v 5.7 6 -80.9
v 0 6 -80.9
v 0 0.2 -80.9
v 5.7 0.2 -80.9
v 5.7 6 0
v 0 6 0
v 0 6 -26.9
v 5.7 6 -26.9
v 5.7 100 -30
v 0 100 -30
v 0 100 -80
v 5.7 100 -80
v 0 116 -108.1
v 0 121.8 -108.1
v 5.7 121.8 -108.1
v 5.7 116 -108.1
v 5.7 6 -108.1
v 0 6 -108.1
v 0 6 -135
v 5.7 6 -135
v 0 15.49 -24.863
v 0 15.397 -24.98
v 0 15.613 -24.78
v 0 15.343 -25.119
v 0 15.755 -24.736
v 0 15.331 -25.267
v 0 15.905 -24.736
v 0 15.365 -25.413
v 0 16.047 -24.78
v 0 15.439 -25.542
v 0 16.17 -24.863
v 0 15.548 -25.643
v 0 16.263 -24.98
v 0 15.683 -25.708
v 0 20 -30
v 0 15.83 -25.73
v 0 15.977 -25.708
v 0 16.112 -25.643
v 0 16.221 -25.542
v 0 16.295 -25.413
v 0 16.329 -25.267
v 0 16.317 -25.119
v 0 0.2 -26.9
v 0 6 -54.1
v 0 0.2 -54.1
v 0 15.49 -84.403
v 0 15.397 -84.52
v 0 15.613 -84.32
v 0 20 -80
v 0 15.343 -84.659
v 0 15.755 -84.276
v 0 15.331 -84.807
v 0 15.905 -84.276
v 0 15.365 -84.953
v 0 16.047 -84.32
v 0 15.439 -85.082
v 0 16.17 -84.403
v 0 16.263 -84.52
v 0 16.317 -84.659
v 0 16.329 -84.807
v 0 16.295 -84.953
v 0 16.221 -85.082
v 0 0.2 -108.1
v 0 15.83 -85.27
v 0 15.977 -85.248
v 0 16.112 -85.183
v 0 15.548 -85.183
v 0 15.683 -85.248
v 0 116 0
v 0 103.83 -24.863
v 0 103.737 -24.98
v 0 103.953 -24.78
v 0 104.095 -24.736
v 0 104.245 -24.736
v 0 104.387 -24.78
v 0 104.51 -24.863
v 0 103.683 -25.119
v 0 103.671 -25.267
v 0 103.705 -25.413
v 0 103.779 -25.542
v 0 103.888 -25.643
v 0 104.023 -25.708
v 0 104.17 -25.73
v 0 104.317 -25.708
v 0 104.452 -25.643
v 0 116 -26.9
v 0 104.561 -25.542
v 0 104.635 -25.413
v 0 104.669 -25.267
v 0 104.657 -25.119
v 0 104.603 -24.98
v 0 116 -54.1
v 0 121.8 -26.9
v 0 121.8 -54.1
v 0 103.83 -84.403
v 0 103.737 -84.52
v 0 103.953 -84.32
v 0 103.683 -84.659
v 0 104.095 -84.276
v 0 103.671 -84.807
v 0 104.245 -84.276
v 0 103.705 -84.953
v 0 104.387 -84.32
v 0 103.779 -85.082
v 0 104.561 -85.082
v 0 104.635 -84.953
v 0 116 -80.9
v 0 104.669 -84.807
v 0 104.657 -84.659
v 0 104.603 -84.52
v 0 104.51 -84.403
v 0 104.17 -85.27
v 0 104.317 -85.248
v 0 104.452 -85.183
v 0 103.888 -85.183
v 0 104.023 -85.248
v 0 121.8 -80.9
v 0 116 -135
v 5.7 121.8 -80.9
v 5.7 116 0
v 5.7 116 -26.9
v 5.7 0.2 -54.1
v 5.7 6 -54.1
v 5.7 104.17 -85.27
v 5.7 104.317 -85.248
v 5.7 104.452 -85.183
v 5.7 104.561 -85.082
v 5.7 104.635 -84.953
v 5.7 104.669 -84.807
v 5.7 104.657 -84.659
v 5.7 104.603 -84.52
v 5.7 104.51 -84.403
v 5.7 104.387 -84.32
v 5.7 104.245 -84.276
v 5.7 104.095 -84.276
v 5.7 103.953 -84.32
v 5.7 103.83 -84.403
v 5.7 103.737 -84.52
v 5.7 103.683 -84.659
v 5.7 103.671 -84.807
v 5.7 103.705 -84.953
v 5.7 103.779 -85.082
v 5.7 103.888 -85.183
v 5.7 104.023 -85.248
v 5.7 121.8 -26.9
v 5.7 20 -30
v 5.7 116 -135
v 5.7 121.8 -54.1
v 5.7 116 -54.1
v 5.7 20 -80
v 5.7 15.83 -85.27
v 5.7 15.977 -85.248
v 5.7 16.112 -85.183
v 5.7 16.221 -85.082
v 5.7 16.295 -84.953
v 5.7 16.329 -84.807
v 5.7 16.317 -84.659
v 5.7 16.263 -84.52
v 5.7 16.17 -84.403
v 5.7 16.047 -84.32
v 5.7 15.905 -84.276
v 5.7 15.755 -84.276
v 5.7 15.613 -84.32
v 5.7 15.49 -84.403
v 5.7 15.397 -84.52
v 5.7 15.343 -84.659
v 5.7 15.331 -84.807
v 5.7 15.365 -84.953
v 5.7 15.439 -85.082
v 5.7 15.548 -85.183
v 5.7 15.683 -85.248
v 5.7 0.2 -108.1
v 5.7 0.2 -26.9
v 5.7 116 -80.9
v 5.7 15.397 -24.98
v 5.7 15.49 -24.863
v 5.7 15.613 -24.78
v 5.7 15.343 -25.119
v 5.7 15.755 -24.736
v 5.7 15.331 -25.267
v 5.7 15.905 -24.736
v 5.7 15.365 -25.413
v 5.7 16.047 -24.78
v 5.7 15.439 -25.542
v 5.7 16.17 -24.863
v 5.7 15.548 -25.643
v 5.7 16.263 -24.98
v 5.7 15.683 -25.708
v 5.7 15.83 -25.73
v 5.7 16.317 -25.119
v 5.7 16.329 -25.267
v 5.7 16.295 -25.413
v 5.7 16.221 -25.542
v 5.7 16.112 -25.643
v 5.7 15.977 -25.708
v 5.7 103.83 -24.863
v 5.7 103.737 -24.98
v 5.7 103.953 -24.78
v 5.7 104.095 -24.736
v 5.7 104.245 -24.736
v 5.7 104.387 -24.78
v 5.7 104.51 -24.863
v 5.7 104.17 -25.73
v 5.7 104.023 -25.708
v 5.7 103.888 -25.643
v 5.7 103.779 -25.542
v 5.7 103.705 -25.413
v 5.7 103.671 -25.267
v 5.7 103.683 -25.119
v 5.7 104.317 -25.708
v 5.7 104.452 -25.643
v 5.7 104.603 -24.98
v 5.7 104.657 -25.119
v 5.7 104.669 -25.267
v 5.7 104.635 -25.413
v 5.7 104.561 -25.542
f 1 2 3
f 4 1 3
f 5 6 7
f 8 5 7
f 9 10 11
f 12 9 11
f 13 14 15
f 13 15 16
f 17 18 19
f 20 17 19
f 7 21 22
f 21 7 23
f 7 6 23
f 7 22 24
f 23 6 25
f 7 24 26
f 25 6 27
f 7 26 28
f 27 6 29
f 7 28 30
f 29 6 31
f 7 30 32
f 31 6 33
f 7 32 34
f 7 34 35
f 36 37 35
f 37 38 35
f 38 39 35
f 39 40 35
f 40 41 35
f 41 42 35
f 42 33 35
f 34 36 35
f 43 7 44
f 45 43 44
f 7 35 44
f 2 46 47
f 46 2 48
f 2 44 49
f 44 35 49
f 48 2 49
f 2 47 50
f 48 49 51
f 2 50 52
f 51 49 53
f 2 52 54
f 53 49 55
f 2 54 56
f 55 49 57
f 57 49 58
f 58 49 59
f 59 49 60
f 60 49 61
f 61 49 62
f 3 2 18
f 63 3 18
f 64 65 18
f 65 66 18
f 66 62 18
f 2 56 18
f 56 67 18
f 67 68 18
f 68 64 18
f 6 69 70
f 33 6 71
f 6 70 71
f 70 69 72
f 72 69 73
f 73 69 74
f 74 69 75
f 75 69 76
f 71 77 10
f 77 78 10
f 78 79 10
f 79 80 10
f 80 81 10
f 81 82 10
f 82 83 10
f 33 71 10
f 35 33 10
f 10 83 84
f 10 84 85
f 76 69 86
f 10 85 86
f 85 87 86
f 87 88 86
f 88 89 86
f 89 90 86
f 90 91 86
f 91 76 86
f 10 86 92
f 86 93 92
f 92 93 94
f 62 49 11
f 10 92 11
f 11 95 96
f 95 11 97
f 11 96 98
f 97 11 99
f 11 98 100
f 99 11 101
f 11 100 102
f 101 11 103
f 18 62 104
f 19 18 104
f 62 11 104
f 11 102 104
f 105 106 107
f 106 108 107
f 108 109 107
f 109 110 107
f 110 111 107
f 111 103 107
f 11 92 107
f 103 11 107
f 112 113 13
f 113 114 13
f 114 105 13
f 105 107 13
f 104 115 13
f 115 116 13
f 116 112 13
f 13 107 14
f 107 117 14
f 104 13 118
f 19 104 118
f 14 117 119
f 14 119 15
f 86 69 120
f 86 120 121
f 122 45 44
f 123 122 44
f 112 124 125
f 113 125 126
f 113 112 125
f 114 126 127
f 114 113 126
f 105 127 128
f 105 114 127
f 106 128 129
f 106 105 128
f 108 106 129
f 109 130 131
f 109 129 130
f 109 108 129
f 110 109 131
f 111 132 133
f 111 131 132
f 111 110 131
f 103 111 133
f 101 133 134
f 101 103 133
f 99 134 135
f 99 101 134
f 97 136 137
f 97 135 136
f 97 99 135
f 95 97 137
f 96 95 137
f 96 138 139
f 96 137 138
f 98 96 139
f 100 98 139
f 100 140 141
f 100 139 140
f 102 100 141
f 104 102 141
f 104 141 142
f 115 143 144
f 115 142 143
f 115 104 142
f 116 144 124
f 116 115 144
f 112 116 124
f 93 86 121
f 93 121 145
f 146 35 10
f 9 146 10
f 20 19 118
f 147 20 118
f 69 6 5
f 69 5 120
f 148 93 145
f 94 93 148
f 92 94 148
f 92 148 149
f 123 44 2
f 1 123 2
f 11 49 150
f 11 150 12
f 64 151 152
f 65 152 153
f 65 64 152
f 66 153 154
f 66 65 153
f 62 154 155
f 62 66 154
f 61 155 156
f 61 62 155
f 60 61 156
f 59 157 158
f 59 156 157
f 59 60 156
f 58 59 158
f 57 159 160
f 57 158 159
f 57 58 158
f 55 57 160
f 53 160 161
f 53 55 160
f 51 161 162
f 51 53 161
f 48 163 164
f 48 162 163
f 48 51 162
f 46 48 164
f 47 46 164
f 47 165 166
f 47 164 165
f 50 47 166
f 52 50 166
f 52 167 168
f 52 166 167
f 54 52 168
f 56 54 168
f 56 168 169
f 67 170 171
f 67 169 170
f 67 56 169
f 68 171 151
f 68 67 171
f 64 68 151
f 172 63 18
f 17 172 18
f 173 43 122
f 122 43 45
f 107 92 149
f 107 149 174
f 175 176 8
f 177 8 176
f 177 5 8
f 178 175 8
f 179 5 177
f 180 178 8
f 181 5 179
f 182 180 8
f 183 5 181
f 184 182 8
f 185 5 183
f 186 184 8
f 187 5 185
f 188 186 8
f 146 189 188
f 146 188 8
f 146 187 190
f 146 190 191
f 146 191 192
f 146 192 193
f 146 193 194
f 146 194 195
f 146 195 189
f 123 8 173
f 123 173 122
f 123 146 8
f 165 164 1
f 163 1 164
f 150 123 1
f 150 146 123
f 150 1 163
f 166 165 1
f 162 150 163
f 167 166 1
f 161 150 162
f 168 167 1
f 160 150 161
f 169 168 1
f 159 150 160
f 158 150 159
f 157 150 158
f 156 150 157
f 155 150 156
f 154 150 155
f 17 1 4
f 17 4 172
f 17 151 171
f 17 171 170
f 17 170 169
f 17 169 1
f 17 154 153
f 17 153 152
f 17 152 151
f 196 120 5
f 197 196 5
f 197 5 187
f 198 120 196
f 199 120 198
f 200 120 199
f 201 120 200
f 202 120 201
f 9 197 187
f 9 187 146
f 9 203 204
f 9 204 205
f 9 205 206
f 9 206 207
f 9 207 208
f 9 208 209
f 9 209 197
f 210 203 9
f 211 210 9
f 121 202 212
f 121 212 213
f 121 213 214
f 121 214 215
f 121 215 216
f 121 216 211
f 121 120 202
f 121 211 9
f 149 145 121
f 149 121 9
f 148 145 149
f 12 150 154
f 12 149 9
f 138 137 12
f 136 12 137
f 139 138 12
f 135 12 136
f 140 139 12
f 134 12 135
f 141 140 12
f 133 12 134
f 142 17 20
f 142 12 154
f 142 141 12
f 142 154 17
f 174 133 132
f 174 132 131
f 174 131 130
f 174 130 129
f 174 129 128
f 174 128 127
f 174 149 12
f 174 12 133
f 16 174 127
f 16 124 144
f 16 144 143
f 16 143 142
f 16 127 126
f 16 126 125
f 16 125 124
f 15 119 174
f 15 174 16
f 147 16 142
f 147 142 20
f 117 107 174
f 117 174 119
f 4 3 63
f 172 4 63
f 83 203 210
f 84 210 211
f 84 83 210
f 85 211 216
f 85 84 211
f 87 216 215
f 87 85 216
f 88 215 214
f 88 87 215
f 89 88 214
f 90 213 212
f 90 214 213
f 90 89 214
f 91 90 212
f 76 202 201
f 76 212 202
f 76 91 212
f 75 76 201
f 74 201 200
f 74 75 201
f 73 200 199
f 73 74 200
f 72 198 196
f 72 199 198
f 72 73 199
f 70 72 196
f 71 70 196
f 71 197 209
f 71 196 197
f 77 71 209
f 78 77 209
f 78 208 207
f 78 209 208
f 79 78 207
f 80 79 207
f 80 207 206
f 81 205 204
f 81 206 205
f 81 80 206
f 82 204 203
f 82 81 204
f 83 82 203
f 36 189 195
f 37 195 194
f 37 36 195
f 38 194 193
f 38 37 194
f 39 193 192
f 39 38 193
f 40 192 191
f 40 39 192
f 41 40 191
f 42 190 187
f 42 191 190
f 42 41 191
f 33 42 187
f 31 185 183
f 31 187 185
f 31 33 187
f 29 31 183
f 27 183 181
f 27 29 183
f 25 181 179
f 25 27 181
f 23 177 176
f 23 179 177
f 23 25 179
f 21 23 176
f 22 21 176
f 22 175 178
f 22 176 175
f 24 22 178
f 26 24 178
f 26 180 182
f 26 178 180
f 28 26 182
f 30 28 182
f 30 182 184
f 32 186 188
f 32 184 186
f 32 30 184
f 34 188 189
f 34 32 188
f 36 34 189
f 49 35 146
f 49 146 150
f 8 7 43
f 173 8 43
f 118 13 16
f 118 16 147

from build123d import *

# Parameters (mm, degrees)
SKETCH1_W           = 135
SKETCH1_H           = 122
BOSS_EXTRUDE1_DEPTH = 5.7
HOLE_W              = 50
HOLE_H              = 80
CUT_EXTRUDE2_DEPTH  = 70
SCREW_LOCATIONS_R   = 0.5
CUT_EXTRUDE3_DEPTH  = 52
CUT_EXTRUDE4_DEPTH  = 5.7


with BuildPart() as part:
    # Sketch1 → Boss-Extrude1 (new body)
    with BuildSketch(Plane(origin=(0, 0, 0), x_dir=(0, 0, -1), z_dir=(1, 0, 0))):
        with Locations((67.5, 61)):
            Rectangle(SKETCH1_W, SKETCH1_H)
    extrude(amount=BOSS_EXTRUDE1_DEPTH)

    # Hole → Cut-Extrude2 (cut)
    with BuildSketch(Plane(origin=(0, 0, 0), x_dir=(0, 0, -1), z_dir=(1, 0, 0))):
        with Locations((55, 60)):
            Rectangle(HOLE_W, HOLE_H)
    extrude(amount=CUT_EXTRUDE2_DEPTH, mode=Mode.SUBTRACT)

    # Screw Locations → Cut-Extrude3 (cut)
    with BuildSketch(Plane(origin=(0, 0, 0), x_dir=(0, 0, -1), z_dir=(1, 0, 0))):
        with Locations((25.23, 104.17)):
            Circle(SCREW_LOCATIONS_R)
        with Locations((84.77, 104.17)):
            Circle(SCREW_LOCATIONS_R)
        with Locations((25.23, 15.83)):
            Circle(SCREW_LOCATIONS_R)
        with Locations((84.77, 15.83)):
            Circle(SCREW_LOCATIONS_R)
    extrude(amount=CUT_EXTRUDE3_DEPTH, mode=Mode.SUBTRACT)

    # Sketch4 → Cut-Extrude4 (cut)
    with BuildSketch(Plane(origin=(0, 0, 0), x_dir=(0, 0, -1), z_dir=(1, 0, 0))):
        Polygon((0, 116), (26.9, 116), (26.9, 121.8), (54.1, 121.8), (54.1, 116), (80.9, 116), (80.9, 121.8), (108.1, 121.8), (108.1, 116), (135, 116), (135, 130), (0, 130), align=None)
        Polygon((0, -8), (0, 6), (26.9, 6), (26.9, 0.2), (54.1, 0.2), (54.1, 6), (80.9, 6), (80.9, 0.2), (108.1, 0.2), (108.1, 6), (135, 6), (135, -8), align=None)
    extrude(amount=CUT_EXTRUDE4_DEPTH, mode=Mode.SUBTRACT)


solid = part.part
